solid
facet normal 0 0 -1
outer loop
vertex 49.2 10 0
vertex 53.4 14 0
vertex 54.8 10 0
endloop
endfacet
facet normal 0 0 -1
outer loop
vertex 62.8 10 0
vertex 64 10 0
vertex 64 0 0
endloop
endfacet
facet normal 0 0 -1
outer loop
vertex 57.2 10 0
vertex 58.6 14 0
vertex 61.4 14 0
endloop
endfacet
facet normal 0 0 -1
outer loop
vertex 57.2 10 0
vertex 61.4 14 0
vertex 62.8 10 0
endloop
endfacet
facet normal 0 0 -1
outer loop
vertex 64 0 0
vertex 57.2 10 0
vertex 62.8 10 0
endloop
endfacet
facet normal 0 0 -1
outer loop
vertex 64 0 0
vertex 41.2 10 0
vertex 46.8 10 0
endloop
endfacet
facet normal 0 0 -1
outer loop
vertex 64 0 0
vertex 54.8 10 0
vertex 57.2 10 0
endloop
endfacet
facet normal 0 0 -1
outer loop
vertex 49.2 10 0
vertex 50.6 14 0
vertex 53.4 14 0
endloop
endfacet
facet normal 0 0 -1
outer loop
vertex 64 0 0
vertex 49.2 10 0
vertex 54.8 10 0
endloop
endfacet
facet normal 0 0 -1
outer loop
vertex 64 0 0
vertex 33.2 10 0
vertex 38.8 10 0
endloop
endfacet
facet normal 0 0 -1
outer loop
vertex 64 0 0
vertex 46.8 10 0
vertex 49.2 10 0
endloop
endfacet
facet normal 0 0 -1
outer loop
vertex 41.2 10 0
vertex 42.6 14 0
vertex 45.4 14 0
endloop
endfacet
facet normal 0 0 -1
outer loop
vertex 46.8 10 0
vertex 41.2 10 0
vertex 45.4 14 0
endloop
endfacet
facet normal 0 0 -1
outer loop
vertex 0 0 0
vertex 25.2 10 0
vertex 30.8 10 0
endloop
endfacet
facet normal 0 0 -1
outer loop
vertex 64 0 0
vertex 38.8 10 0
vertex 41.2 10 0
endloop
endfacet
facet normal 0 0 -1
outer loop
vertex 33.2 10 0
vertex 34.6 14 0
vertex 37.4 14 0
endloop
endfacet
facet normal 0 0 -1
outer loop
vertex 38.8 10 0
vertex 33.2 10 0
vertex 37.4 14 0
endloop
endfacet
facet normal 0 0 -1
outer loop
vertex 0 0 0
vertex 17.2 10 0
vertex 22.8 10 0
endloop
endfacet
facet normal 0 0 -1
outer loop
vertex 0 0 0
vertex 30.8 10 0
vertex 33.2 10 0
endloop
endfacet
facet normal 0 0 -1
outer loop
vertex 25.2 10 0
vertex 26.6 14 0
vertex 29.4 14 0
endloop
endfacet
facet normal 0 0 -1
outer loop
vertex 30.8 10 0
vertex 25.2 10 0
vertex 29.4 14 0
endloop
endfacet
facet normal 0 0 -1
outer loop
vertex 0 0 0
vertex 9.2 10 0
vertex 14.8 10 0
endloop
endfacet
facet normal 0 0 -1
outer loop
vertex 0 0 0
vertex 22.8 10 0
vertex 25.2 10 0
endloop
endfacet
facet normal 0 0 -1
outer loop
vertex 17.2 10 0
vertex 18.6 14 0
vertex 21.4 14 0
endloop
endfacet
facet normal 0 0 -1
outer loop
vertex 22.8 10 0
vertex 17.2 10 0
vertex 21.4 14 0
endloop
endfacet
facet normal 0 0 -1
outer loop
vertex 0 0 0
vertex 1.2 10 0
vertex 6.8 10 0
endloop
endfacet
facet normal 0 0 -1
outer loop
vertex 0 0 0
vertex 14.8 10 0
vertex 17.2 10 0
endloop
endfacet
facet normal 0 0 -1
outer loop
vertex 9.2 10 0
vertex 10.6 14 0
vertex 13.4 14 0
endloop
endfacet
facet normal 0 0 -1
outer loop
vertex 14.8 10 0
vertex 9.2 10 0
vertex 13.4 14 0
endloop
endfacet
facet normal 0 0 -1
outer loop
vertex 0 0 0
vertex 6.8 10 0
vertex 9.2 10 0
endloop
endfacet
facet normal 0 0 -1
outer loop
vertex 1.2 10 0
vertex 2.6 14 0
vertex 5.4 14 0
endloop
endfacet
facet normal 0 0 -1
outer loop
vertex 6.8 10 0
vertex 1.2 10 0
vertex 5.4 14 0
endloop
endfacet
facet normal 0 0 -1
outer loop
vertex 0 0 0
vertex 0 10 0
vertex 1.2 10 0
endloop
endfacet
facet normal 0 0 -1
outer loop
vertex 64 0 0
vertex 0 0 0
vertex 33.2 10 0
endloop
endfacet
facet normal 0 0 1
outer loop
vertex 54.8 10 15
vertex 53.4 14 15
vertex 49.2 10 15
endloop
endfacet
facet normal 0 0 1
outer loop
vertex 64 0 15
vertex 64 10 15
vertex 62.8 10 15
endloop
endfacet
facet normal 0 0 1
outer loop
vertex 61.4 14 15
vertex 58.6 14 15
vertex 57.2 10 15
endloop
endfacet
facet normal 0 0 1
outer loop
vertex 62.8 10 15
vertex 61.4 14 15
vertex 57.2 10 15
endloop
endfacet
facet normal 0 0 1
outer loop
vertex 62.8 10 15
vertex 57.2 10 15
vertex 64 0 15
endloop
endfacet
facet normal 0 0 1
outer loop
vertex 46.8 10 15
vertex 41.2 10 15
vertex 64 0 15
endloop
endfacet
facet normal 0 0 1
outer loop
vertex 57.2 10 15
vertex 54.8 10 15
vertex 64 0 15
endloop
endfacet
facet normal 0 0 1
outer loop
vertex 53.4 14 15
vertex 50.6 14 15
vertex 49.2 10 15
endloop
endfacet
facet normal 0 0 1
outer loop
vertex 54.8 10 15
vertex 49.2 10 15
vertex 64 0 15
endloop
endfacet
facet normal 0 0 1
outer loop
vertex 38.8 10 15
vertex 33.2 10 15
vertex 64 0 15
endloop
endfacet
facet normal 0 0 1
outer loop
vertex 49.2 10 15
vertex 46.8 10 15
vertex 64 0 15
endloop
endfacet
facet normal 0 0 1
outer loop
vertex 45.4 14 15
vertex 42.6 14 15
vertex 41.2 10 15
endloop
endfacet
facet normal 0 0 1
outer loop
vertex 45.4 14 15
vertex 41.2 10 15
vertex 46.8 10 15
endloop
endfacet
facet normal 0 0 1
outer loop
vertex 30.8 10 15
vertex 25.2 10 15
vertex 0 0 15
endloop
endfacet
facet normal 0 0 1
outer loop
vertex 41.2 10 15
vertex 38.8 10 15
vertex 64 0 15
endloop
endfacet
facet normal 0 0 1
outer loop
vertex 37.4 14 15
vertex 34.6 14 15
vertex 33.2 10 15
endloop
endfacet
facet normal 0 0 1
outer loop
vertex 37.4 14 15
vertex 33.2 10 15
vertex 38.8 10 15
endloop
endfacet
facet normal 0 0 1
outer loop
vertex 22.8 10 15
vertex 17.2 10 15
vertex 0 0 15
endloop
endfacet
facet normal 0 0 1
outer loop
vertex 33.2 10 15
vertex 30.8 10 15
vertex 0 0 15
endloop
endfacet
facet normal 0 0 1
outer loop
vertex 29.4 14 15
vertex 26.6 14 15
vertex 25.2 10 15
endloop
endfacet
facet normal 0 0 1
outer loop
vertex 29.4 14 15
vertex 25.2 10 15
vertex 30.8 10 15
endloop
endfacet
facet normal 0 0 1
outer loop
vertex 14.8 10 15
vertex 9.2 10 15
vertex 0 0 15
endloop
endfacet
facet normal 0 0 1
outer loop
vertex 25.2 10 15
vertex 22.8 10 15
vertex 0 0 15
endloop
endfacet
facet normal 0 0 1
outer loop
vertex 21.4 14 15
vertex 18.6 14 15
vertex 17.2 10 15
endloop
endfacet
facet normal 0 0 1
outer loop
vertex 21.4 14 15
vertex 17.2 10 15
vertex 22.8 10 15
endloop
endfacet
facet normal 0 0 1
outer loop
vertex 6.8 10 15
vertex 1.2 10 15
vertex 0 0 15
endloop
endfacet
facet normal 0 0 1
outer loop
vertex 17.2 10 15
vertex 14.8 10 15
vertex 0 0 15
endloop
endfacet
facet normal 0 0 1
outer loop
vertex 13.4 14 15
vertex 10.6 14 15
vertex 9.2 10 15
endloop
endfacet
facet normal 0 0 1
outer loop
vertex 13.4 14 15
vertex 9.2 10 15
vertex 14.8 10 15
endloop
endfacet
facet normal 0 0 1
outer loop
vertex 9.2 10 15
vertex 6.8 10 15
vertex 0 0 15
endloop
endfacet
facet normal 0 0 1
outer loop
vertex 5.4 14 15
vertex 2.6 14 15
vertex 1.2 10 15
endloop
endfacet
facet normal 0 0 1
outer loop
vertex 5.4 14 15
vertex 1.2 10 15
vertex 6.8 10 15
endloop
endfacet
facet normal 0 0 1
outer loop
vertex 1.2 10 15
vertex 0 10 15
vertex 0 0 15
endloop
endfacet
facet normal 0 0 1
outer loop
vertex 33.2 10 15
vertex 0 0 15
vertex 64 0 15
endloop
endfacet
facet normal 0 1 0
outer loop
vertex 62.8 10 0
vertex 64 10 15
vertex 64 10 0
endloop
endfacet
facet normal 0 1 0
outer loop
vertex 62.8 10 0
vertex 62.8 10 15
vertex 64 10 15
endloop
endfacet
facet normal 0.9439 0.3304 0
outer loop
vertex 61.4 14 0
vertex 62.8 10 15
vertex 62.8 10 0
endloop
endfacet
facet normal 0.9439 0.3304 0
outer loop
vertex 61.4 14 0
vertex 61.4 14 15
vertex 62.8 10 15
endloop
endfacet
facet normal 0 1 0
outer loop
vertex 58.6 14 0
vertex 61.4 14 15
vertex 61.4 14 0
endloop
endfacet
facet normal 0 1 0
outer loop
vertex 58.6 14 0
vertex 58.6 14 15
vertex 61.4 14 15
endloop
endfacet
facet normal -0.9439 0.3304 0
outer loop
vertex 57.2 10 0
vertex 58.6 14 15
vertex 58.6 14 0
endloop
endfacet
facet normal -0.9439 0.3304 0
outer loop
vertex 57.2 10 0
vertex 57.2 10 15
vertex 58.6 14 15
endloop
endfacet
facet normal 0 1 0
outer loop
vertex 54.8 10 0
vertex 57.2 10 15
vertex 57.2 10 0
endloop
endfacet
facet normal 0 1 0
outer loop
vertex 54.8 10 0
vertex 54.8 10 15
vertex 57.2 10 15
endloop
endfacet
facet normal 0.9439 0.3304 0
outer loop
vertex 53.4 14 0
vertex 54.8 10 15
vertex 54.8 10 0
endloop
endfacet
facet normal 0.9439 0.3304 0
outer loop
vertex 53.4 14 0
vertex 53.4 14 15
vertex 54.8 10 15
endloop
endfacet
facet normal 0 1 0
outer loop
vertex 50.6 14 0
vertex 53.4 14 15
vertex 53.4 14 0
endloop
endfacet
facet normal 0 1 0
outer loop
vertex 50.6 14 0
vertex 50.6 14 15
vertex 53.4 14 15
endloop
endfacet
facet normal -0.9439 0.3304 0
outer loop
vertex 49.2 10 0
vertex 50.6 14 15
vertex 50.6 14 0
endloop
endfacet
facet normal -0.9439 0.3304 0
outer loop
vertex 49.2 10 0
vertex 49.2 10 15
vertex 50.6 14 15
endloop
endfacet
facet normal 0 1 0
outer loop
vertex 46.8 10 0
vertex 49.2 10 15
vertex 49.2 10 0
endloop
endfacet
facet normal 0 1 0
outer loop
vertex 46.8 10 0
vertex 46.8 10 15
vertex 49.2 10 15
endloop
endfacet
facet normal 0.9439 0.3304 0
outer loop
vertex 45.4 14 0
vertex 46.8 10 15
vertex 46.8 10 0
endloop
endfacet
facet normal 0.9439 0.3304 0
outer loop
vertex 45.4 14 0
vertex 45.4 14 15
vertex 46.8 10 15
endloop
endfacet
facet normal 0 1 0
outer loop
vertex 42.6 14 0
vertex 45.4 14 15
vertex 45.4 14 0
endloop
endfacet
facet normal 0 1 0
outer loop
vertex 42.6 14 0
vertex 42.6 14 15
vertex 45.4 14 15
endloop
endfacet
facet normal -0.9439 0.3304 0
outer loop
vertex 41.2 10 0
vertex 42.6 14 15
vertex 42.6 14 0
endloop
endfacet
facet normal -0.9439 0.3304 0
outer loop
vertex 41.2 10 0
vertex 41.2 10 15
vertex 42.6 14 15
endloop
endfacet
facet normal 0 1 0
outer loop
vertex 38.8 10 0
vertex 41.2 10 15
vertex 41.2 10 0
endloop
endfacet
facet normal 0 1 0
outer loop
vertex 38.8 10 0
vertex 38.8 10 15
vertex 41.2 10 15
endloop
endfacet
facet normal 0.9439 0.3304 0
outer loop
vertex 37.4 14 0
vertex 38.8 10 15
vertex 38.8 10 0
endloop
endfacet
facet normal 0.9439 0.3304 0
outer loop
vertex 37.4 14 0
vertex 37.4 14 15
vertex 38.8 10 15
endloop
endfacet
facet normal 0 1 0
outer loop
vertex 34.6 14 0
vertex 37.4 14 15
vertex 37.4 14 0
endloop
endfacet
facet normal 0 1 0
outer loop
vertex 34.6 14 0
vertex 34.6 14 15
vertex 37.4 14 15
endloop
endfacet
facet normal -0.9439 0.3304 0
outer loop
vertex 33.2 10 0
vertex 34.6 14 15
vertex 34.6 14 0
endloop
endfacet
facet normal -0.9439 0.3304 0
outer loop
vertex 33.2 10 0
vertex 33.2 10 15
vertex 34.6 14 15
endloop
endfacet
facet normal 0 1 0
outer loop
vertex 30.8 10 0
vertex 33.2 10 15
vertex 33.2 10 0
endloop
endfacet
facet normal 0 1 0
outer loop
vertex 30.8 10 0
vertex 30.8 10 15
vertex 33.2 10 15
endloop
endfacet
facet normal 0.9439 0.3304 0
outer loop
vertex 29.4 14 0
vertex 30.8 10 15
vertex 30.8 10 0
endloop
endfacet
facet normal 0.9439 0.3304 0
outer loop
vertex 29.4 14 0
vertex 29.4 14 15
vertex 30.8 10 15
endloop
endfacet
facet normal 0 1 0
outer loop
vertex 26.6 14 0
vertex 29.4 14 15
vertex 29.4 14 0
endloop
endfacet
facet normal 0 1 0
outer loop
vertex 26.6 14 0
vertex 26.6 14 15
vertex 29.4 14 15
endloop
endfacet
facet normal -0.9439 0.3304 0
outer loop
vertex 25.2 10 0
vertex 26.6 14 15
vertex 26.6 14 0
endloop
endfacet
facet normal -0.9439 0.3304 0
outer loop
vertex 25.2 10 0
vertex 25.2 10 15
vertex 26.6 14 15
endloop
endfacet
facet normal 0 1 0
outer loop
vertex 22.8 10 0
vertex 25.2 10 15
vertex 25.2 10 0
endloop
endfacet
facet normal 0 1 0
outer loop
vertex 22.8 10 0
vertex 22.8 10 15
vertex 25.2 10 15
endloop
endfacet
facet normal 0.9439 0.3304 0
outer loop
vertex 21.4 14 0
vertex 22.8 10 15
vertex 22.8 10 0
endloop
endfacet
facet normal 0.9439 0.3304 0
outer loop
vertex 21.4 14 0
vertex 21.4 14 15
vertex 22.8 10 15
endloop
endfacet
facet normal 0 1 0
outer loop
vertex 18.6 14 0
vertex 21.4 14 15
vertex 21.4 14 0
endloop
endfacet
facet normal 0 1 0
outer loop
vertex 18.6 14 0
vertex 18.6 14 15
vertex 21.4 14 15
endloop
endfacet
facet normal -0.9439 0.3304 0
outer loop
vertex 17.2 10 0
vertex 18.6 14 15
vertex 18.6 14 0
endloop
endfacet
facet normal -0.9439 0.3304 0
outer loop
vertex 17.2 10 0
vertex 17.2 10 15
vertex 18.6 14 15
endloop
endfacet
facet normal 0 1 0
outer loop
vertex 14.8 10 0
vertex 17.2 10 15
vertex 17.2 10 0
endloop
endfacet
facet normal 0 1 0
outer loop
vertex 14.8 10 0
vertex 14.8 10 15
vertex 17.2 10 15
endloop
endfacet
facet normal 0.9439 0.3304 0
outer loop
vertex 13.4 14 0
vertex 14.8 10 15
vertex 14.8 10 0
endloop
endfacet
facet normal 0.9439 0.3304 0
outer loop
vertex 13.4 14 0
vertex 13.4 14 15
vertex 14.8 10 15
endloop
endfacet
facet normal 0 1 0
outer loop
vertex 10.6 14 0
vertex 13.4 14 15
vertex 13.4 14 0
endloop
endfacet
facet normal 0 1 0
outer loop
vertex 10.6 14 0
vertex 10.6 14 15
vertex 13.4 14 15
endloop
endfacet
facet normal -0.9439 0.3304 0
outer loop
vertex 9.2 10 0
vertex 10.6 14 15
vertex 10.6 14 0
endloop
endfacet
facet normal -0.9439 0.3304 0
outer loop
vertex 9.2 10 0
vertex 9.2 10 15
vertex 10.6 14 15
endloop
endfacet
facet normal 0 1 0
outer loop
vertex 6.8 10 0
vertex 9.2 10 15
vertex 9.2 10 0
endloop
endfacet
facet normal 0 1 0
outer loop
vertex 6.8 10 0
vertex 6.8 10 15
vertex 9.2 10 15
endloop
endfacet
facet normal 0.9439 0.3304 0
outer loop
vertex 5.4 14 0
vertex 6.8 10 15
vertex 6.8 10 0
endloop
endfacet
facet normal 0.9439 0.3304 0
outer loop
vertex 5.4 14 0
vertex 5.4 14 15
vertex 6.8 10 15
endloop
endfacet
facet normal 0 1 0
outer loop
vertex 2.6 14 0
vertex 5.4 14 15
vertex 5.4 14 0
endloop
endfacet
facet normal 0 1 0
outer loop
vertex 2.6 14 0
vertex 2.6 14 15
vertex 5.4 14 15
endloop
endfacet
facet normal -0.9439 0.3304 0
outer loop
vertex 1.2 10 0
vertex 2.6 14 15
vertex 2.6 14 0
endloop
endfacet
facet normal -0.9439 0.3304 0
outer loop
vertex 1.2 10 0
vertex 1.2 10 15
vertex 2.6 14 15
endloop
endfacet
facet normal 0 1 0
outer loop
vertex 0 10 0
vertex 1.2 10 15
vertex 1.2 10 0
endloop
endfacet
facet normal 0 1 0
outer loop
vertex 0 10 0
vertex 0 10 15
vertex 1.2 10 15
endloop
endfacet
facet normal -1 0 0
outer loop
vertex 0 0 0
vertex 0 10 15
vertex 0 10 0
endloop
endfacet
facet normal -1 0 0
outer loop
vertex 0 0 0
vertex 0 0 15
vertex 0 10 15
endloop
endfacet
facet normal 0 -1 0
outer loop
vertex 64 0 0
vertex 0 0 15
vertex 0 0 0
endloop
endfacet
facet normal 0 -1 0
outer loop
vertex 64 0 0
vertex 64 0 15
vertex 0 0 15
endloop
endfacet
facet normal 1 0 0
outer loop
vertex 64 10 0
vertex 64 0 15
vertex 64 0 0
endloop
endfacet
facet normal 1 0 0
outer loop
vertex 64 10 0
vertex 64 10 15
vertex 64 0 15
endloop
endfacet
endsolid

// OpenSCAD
$fn = 32;

// ----------------------------------------------------------------------
// Gear rack: 8 teeth, pitch 8 mm
// ----------------------------------------------------------------------

// --- parameters (mm) ---
teeth = 8;                // number of teeth
pitch = 8;                // tooth pitch, X
root_w = 5.6;             // tooth width at the root
tip_w = 2.8;              // tooth width at the tip
base_h = 10;              // rack body height, Y
tooth_h = 4;              // tooth height above the body
plate_t = 15;             // rack width, Z (extrusion height)

rack_l = teeth * pitch;  // overall length
total_h = base_h + tooth_h;  // overall height

profile = [[0, 0], [64, 0], [64, 10], [62.8, 10], [61.4, 14], [58.6, 14], [57.2, 10], [54.8, 10], [53.4, 14], [50.6, 14], [49.2, 10], [46.8, 10], [45.4, 14], [42.6, 14], [41.2, 10], [38.8, 10], [37.4, 14], [34.6, 14], [33.2, 10], [30.8, 10], [29.4, 14], [26.6, 14], [25.2, 10], [22.8, 10], [21.4, 14], [18.6, 14], [17.2, 10], [14.8, 10], [13.4, 14], [10.6, 14], [9.2, 10], [6.8, 10], [5.4, 14], [2.6, 14], [1.2, 10], [0, 10]];  // primary outline, 36 points, counter clockwise

// --- the one profile operation ---
linear_extrude(height = plate_t) polygon(points = profile);
